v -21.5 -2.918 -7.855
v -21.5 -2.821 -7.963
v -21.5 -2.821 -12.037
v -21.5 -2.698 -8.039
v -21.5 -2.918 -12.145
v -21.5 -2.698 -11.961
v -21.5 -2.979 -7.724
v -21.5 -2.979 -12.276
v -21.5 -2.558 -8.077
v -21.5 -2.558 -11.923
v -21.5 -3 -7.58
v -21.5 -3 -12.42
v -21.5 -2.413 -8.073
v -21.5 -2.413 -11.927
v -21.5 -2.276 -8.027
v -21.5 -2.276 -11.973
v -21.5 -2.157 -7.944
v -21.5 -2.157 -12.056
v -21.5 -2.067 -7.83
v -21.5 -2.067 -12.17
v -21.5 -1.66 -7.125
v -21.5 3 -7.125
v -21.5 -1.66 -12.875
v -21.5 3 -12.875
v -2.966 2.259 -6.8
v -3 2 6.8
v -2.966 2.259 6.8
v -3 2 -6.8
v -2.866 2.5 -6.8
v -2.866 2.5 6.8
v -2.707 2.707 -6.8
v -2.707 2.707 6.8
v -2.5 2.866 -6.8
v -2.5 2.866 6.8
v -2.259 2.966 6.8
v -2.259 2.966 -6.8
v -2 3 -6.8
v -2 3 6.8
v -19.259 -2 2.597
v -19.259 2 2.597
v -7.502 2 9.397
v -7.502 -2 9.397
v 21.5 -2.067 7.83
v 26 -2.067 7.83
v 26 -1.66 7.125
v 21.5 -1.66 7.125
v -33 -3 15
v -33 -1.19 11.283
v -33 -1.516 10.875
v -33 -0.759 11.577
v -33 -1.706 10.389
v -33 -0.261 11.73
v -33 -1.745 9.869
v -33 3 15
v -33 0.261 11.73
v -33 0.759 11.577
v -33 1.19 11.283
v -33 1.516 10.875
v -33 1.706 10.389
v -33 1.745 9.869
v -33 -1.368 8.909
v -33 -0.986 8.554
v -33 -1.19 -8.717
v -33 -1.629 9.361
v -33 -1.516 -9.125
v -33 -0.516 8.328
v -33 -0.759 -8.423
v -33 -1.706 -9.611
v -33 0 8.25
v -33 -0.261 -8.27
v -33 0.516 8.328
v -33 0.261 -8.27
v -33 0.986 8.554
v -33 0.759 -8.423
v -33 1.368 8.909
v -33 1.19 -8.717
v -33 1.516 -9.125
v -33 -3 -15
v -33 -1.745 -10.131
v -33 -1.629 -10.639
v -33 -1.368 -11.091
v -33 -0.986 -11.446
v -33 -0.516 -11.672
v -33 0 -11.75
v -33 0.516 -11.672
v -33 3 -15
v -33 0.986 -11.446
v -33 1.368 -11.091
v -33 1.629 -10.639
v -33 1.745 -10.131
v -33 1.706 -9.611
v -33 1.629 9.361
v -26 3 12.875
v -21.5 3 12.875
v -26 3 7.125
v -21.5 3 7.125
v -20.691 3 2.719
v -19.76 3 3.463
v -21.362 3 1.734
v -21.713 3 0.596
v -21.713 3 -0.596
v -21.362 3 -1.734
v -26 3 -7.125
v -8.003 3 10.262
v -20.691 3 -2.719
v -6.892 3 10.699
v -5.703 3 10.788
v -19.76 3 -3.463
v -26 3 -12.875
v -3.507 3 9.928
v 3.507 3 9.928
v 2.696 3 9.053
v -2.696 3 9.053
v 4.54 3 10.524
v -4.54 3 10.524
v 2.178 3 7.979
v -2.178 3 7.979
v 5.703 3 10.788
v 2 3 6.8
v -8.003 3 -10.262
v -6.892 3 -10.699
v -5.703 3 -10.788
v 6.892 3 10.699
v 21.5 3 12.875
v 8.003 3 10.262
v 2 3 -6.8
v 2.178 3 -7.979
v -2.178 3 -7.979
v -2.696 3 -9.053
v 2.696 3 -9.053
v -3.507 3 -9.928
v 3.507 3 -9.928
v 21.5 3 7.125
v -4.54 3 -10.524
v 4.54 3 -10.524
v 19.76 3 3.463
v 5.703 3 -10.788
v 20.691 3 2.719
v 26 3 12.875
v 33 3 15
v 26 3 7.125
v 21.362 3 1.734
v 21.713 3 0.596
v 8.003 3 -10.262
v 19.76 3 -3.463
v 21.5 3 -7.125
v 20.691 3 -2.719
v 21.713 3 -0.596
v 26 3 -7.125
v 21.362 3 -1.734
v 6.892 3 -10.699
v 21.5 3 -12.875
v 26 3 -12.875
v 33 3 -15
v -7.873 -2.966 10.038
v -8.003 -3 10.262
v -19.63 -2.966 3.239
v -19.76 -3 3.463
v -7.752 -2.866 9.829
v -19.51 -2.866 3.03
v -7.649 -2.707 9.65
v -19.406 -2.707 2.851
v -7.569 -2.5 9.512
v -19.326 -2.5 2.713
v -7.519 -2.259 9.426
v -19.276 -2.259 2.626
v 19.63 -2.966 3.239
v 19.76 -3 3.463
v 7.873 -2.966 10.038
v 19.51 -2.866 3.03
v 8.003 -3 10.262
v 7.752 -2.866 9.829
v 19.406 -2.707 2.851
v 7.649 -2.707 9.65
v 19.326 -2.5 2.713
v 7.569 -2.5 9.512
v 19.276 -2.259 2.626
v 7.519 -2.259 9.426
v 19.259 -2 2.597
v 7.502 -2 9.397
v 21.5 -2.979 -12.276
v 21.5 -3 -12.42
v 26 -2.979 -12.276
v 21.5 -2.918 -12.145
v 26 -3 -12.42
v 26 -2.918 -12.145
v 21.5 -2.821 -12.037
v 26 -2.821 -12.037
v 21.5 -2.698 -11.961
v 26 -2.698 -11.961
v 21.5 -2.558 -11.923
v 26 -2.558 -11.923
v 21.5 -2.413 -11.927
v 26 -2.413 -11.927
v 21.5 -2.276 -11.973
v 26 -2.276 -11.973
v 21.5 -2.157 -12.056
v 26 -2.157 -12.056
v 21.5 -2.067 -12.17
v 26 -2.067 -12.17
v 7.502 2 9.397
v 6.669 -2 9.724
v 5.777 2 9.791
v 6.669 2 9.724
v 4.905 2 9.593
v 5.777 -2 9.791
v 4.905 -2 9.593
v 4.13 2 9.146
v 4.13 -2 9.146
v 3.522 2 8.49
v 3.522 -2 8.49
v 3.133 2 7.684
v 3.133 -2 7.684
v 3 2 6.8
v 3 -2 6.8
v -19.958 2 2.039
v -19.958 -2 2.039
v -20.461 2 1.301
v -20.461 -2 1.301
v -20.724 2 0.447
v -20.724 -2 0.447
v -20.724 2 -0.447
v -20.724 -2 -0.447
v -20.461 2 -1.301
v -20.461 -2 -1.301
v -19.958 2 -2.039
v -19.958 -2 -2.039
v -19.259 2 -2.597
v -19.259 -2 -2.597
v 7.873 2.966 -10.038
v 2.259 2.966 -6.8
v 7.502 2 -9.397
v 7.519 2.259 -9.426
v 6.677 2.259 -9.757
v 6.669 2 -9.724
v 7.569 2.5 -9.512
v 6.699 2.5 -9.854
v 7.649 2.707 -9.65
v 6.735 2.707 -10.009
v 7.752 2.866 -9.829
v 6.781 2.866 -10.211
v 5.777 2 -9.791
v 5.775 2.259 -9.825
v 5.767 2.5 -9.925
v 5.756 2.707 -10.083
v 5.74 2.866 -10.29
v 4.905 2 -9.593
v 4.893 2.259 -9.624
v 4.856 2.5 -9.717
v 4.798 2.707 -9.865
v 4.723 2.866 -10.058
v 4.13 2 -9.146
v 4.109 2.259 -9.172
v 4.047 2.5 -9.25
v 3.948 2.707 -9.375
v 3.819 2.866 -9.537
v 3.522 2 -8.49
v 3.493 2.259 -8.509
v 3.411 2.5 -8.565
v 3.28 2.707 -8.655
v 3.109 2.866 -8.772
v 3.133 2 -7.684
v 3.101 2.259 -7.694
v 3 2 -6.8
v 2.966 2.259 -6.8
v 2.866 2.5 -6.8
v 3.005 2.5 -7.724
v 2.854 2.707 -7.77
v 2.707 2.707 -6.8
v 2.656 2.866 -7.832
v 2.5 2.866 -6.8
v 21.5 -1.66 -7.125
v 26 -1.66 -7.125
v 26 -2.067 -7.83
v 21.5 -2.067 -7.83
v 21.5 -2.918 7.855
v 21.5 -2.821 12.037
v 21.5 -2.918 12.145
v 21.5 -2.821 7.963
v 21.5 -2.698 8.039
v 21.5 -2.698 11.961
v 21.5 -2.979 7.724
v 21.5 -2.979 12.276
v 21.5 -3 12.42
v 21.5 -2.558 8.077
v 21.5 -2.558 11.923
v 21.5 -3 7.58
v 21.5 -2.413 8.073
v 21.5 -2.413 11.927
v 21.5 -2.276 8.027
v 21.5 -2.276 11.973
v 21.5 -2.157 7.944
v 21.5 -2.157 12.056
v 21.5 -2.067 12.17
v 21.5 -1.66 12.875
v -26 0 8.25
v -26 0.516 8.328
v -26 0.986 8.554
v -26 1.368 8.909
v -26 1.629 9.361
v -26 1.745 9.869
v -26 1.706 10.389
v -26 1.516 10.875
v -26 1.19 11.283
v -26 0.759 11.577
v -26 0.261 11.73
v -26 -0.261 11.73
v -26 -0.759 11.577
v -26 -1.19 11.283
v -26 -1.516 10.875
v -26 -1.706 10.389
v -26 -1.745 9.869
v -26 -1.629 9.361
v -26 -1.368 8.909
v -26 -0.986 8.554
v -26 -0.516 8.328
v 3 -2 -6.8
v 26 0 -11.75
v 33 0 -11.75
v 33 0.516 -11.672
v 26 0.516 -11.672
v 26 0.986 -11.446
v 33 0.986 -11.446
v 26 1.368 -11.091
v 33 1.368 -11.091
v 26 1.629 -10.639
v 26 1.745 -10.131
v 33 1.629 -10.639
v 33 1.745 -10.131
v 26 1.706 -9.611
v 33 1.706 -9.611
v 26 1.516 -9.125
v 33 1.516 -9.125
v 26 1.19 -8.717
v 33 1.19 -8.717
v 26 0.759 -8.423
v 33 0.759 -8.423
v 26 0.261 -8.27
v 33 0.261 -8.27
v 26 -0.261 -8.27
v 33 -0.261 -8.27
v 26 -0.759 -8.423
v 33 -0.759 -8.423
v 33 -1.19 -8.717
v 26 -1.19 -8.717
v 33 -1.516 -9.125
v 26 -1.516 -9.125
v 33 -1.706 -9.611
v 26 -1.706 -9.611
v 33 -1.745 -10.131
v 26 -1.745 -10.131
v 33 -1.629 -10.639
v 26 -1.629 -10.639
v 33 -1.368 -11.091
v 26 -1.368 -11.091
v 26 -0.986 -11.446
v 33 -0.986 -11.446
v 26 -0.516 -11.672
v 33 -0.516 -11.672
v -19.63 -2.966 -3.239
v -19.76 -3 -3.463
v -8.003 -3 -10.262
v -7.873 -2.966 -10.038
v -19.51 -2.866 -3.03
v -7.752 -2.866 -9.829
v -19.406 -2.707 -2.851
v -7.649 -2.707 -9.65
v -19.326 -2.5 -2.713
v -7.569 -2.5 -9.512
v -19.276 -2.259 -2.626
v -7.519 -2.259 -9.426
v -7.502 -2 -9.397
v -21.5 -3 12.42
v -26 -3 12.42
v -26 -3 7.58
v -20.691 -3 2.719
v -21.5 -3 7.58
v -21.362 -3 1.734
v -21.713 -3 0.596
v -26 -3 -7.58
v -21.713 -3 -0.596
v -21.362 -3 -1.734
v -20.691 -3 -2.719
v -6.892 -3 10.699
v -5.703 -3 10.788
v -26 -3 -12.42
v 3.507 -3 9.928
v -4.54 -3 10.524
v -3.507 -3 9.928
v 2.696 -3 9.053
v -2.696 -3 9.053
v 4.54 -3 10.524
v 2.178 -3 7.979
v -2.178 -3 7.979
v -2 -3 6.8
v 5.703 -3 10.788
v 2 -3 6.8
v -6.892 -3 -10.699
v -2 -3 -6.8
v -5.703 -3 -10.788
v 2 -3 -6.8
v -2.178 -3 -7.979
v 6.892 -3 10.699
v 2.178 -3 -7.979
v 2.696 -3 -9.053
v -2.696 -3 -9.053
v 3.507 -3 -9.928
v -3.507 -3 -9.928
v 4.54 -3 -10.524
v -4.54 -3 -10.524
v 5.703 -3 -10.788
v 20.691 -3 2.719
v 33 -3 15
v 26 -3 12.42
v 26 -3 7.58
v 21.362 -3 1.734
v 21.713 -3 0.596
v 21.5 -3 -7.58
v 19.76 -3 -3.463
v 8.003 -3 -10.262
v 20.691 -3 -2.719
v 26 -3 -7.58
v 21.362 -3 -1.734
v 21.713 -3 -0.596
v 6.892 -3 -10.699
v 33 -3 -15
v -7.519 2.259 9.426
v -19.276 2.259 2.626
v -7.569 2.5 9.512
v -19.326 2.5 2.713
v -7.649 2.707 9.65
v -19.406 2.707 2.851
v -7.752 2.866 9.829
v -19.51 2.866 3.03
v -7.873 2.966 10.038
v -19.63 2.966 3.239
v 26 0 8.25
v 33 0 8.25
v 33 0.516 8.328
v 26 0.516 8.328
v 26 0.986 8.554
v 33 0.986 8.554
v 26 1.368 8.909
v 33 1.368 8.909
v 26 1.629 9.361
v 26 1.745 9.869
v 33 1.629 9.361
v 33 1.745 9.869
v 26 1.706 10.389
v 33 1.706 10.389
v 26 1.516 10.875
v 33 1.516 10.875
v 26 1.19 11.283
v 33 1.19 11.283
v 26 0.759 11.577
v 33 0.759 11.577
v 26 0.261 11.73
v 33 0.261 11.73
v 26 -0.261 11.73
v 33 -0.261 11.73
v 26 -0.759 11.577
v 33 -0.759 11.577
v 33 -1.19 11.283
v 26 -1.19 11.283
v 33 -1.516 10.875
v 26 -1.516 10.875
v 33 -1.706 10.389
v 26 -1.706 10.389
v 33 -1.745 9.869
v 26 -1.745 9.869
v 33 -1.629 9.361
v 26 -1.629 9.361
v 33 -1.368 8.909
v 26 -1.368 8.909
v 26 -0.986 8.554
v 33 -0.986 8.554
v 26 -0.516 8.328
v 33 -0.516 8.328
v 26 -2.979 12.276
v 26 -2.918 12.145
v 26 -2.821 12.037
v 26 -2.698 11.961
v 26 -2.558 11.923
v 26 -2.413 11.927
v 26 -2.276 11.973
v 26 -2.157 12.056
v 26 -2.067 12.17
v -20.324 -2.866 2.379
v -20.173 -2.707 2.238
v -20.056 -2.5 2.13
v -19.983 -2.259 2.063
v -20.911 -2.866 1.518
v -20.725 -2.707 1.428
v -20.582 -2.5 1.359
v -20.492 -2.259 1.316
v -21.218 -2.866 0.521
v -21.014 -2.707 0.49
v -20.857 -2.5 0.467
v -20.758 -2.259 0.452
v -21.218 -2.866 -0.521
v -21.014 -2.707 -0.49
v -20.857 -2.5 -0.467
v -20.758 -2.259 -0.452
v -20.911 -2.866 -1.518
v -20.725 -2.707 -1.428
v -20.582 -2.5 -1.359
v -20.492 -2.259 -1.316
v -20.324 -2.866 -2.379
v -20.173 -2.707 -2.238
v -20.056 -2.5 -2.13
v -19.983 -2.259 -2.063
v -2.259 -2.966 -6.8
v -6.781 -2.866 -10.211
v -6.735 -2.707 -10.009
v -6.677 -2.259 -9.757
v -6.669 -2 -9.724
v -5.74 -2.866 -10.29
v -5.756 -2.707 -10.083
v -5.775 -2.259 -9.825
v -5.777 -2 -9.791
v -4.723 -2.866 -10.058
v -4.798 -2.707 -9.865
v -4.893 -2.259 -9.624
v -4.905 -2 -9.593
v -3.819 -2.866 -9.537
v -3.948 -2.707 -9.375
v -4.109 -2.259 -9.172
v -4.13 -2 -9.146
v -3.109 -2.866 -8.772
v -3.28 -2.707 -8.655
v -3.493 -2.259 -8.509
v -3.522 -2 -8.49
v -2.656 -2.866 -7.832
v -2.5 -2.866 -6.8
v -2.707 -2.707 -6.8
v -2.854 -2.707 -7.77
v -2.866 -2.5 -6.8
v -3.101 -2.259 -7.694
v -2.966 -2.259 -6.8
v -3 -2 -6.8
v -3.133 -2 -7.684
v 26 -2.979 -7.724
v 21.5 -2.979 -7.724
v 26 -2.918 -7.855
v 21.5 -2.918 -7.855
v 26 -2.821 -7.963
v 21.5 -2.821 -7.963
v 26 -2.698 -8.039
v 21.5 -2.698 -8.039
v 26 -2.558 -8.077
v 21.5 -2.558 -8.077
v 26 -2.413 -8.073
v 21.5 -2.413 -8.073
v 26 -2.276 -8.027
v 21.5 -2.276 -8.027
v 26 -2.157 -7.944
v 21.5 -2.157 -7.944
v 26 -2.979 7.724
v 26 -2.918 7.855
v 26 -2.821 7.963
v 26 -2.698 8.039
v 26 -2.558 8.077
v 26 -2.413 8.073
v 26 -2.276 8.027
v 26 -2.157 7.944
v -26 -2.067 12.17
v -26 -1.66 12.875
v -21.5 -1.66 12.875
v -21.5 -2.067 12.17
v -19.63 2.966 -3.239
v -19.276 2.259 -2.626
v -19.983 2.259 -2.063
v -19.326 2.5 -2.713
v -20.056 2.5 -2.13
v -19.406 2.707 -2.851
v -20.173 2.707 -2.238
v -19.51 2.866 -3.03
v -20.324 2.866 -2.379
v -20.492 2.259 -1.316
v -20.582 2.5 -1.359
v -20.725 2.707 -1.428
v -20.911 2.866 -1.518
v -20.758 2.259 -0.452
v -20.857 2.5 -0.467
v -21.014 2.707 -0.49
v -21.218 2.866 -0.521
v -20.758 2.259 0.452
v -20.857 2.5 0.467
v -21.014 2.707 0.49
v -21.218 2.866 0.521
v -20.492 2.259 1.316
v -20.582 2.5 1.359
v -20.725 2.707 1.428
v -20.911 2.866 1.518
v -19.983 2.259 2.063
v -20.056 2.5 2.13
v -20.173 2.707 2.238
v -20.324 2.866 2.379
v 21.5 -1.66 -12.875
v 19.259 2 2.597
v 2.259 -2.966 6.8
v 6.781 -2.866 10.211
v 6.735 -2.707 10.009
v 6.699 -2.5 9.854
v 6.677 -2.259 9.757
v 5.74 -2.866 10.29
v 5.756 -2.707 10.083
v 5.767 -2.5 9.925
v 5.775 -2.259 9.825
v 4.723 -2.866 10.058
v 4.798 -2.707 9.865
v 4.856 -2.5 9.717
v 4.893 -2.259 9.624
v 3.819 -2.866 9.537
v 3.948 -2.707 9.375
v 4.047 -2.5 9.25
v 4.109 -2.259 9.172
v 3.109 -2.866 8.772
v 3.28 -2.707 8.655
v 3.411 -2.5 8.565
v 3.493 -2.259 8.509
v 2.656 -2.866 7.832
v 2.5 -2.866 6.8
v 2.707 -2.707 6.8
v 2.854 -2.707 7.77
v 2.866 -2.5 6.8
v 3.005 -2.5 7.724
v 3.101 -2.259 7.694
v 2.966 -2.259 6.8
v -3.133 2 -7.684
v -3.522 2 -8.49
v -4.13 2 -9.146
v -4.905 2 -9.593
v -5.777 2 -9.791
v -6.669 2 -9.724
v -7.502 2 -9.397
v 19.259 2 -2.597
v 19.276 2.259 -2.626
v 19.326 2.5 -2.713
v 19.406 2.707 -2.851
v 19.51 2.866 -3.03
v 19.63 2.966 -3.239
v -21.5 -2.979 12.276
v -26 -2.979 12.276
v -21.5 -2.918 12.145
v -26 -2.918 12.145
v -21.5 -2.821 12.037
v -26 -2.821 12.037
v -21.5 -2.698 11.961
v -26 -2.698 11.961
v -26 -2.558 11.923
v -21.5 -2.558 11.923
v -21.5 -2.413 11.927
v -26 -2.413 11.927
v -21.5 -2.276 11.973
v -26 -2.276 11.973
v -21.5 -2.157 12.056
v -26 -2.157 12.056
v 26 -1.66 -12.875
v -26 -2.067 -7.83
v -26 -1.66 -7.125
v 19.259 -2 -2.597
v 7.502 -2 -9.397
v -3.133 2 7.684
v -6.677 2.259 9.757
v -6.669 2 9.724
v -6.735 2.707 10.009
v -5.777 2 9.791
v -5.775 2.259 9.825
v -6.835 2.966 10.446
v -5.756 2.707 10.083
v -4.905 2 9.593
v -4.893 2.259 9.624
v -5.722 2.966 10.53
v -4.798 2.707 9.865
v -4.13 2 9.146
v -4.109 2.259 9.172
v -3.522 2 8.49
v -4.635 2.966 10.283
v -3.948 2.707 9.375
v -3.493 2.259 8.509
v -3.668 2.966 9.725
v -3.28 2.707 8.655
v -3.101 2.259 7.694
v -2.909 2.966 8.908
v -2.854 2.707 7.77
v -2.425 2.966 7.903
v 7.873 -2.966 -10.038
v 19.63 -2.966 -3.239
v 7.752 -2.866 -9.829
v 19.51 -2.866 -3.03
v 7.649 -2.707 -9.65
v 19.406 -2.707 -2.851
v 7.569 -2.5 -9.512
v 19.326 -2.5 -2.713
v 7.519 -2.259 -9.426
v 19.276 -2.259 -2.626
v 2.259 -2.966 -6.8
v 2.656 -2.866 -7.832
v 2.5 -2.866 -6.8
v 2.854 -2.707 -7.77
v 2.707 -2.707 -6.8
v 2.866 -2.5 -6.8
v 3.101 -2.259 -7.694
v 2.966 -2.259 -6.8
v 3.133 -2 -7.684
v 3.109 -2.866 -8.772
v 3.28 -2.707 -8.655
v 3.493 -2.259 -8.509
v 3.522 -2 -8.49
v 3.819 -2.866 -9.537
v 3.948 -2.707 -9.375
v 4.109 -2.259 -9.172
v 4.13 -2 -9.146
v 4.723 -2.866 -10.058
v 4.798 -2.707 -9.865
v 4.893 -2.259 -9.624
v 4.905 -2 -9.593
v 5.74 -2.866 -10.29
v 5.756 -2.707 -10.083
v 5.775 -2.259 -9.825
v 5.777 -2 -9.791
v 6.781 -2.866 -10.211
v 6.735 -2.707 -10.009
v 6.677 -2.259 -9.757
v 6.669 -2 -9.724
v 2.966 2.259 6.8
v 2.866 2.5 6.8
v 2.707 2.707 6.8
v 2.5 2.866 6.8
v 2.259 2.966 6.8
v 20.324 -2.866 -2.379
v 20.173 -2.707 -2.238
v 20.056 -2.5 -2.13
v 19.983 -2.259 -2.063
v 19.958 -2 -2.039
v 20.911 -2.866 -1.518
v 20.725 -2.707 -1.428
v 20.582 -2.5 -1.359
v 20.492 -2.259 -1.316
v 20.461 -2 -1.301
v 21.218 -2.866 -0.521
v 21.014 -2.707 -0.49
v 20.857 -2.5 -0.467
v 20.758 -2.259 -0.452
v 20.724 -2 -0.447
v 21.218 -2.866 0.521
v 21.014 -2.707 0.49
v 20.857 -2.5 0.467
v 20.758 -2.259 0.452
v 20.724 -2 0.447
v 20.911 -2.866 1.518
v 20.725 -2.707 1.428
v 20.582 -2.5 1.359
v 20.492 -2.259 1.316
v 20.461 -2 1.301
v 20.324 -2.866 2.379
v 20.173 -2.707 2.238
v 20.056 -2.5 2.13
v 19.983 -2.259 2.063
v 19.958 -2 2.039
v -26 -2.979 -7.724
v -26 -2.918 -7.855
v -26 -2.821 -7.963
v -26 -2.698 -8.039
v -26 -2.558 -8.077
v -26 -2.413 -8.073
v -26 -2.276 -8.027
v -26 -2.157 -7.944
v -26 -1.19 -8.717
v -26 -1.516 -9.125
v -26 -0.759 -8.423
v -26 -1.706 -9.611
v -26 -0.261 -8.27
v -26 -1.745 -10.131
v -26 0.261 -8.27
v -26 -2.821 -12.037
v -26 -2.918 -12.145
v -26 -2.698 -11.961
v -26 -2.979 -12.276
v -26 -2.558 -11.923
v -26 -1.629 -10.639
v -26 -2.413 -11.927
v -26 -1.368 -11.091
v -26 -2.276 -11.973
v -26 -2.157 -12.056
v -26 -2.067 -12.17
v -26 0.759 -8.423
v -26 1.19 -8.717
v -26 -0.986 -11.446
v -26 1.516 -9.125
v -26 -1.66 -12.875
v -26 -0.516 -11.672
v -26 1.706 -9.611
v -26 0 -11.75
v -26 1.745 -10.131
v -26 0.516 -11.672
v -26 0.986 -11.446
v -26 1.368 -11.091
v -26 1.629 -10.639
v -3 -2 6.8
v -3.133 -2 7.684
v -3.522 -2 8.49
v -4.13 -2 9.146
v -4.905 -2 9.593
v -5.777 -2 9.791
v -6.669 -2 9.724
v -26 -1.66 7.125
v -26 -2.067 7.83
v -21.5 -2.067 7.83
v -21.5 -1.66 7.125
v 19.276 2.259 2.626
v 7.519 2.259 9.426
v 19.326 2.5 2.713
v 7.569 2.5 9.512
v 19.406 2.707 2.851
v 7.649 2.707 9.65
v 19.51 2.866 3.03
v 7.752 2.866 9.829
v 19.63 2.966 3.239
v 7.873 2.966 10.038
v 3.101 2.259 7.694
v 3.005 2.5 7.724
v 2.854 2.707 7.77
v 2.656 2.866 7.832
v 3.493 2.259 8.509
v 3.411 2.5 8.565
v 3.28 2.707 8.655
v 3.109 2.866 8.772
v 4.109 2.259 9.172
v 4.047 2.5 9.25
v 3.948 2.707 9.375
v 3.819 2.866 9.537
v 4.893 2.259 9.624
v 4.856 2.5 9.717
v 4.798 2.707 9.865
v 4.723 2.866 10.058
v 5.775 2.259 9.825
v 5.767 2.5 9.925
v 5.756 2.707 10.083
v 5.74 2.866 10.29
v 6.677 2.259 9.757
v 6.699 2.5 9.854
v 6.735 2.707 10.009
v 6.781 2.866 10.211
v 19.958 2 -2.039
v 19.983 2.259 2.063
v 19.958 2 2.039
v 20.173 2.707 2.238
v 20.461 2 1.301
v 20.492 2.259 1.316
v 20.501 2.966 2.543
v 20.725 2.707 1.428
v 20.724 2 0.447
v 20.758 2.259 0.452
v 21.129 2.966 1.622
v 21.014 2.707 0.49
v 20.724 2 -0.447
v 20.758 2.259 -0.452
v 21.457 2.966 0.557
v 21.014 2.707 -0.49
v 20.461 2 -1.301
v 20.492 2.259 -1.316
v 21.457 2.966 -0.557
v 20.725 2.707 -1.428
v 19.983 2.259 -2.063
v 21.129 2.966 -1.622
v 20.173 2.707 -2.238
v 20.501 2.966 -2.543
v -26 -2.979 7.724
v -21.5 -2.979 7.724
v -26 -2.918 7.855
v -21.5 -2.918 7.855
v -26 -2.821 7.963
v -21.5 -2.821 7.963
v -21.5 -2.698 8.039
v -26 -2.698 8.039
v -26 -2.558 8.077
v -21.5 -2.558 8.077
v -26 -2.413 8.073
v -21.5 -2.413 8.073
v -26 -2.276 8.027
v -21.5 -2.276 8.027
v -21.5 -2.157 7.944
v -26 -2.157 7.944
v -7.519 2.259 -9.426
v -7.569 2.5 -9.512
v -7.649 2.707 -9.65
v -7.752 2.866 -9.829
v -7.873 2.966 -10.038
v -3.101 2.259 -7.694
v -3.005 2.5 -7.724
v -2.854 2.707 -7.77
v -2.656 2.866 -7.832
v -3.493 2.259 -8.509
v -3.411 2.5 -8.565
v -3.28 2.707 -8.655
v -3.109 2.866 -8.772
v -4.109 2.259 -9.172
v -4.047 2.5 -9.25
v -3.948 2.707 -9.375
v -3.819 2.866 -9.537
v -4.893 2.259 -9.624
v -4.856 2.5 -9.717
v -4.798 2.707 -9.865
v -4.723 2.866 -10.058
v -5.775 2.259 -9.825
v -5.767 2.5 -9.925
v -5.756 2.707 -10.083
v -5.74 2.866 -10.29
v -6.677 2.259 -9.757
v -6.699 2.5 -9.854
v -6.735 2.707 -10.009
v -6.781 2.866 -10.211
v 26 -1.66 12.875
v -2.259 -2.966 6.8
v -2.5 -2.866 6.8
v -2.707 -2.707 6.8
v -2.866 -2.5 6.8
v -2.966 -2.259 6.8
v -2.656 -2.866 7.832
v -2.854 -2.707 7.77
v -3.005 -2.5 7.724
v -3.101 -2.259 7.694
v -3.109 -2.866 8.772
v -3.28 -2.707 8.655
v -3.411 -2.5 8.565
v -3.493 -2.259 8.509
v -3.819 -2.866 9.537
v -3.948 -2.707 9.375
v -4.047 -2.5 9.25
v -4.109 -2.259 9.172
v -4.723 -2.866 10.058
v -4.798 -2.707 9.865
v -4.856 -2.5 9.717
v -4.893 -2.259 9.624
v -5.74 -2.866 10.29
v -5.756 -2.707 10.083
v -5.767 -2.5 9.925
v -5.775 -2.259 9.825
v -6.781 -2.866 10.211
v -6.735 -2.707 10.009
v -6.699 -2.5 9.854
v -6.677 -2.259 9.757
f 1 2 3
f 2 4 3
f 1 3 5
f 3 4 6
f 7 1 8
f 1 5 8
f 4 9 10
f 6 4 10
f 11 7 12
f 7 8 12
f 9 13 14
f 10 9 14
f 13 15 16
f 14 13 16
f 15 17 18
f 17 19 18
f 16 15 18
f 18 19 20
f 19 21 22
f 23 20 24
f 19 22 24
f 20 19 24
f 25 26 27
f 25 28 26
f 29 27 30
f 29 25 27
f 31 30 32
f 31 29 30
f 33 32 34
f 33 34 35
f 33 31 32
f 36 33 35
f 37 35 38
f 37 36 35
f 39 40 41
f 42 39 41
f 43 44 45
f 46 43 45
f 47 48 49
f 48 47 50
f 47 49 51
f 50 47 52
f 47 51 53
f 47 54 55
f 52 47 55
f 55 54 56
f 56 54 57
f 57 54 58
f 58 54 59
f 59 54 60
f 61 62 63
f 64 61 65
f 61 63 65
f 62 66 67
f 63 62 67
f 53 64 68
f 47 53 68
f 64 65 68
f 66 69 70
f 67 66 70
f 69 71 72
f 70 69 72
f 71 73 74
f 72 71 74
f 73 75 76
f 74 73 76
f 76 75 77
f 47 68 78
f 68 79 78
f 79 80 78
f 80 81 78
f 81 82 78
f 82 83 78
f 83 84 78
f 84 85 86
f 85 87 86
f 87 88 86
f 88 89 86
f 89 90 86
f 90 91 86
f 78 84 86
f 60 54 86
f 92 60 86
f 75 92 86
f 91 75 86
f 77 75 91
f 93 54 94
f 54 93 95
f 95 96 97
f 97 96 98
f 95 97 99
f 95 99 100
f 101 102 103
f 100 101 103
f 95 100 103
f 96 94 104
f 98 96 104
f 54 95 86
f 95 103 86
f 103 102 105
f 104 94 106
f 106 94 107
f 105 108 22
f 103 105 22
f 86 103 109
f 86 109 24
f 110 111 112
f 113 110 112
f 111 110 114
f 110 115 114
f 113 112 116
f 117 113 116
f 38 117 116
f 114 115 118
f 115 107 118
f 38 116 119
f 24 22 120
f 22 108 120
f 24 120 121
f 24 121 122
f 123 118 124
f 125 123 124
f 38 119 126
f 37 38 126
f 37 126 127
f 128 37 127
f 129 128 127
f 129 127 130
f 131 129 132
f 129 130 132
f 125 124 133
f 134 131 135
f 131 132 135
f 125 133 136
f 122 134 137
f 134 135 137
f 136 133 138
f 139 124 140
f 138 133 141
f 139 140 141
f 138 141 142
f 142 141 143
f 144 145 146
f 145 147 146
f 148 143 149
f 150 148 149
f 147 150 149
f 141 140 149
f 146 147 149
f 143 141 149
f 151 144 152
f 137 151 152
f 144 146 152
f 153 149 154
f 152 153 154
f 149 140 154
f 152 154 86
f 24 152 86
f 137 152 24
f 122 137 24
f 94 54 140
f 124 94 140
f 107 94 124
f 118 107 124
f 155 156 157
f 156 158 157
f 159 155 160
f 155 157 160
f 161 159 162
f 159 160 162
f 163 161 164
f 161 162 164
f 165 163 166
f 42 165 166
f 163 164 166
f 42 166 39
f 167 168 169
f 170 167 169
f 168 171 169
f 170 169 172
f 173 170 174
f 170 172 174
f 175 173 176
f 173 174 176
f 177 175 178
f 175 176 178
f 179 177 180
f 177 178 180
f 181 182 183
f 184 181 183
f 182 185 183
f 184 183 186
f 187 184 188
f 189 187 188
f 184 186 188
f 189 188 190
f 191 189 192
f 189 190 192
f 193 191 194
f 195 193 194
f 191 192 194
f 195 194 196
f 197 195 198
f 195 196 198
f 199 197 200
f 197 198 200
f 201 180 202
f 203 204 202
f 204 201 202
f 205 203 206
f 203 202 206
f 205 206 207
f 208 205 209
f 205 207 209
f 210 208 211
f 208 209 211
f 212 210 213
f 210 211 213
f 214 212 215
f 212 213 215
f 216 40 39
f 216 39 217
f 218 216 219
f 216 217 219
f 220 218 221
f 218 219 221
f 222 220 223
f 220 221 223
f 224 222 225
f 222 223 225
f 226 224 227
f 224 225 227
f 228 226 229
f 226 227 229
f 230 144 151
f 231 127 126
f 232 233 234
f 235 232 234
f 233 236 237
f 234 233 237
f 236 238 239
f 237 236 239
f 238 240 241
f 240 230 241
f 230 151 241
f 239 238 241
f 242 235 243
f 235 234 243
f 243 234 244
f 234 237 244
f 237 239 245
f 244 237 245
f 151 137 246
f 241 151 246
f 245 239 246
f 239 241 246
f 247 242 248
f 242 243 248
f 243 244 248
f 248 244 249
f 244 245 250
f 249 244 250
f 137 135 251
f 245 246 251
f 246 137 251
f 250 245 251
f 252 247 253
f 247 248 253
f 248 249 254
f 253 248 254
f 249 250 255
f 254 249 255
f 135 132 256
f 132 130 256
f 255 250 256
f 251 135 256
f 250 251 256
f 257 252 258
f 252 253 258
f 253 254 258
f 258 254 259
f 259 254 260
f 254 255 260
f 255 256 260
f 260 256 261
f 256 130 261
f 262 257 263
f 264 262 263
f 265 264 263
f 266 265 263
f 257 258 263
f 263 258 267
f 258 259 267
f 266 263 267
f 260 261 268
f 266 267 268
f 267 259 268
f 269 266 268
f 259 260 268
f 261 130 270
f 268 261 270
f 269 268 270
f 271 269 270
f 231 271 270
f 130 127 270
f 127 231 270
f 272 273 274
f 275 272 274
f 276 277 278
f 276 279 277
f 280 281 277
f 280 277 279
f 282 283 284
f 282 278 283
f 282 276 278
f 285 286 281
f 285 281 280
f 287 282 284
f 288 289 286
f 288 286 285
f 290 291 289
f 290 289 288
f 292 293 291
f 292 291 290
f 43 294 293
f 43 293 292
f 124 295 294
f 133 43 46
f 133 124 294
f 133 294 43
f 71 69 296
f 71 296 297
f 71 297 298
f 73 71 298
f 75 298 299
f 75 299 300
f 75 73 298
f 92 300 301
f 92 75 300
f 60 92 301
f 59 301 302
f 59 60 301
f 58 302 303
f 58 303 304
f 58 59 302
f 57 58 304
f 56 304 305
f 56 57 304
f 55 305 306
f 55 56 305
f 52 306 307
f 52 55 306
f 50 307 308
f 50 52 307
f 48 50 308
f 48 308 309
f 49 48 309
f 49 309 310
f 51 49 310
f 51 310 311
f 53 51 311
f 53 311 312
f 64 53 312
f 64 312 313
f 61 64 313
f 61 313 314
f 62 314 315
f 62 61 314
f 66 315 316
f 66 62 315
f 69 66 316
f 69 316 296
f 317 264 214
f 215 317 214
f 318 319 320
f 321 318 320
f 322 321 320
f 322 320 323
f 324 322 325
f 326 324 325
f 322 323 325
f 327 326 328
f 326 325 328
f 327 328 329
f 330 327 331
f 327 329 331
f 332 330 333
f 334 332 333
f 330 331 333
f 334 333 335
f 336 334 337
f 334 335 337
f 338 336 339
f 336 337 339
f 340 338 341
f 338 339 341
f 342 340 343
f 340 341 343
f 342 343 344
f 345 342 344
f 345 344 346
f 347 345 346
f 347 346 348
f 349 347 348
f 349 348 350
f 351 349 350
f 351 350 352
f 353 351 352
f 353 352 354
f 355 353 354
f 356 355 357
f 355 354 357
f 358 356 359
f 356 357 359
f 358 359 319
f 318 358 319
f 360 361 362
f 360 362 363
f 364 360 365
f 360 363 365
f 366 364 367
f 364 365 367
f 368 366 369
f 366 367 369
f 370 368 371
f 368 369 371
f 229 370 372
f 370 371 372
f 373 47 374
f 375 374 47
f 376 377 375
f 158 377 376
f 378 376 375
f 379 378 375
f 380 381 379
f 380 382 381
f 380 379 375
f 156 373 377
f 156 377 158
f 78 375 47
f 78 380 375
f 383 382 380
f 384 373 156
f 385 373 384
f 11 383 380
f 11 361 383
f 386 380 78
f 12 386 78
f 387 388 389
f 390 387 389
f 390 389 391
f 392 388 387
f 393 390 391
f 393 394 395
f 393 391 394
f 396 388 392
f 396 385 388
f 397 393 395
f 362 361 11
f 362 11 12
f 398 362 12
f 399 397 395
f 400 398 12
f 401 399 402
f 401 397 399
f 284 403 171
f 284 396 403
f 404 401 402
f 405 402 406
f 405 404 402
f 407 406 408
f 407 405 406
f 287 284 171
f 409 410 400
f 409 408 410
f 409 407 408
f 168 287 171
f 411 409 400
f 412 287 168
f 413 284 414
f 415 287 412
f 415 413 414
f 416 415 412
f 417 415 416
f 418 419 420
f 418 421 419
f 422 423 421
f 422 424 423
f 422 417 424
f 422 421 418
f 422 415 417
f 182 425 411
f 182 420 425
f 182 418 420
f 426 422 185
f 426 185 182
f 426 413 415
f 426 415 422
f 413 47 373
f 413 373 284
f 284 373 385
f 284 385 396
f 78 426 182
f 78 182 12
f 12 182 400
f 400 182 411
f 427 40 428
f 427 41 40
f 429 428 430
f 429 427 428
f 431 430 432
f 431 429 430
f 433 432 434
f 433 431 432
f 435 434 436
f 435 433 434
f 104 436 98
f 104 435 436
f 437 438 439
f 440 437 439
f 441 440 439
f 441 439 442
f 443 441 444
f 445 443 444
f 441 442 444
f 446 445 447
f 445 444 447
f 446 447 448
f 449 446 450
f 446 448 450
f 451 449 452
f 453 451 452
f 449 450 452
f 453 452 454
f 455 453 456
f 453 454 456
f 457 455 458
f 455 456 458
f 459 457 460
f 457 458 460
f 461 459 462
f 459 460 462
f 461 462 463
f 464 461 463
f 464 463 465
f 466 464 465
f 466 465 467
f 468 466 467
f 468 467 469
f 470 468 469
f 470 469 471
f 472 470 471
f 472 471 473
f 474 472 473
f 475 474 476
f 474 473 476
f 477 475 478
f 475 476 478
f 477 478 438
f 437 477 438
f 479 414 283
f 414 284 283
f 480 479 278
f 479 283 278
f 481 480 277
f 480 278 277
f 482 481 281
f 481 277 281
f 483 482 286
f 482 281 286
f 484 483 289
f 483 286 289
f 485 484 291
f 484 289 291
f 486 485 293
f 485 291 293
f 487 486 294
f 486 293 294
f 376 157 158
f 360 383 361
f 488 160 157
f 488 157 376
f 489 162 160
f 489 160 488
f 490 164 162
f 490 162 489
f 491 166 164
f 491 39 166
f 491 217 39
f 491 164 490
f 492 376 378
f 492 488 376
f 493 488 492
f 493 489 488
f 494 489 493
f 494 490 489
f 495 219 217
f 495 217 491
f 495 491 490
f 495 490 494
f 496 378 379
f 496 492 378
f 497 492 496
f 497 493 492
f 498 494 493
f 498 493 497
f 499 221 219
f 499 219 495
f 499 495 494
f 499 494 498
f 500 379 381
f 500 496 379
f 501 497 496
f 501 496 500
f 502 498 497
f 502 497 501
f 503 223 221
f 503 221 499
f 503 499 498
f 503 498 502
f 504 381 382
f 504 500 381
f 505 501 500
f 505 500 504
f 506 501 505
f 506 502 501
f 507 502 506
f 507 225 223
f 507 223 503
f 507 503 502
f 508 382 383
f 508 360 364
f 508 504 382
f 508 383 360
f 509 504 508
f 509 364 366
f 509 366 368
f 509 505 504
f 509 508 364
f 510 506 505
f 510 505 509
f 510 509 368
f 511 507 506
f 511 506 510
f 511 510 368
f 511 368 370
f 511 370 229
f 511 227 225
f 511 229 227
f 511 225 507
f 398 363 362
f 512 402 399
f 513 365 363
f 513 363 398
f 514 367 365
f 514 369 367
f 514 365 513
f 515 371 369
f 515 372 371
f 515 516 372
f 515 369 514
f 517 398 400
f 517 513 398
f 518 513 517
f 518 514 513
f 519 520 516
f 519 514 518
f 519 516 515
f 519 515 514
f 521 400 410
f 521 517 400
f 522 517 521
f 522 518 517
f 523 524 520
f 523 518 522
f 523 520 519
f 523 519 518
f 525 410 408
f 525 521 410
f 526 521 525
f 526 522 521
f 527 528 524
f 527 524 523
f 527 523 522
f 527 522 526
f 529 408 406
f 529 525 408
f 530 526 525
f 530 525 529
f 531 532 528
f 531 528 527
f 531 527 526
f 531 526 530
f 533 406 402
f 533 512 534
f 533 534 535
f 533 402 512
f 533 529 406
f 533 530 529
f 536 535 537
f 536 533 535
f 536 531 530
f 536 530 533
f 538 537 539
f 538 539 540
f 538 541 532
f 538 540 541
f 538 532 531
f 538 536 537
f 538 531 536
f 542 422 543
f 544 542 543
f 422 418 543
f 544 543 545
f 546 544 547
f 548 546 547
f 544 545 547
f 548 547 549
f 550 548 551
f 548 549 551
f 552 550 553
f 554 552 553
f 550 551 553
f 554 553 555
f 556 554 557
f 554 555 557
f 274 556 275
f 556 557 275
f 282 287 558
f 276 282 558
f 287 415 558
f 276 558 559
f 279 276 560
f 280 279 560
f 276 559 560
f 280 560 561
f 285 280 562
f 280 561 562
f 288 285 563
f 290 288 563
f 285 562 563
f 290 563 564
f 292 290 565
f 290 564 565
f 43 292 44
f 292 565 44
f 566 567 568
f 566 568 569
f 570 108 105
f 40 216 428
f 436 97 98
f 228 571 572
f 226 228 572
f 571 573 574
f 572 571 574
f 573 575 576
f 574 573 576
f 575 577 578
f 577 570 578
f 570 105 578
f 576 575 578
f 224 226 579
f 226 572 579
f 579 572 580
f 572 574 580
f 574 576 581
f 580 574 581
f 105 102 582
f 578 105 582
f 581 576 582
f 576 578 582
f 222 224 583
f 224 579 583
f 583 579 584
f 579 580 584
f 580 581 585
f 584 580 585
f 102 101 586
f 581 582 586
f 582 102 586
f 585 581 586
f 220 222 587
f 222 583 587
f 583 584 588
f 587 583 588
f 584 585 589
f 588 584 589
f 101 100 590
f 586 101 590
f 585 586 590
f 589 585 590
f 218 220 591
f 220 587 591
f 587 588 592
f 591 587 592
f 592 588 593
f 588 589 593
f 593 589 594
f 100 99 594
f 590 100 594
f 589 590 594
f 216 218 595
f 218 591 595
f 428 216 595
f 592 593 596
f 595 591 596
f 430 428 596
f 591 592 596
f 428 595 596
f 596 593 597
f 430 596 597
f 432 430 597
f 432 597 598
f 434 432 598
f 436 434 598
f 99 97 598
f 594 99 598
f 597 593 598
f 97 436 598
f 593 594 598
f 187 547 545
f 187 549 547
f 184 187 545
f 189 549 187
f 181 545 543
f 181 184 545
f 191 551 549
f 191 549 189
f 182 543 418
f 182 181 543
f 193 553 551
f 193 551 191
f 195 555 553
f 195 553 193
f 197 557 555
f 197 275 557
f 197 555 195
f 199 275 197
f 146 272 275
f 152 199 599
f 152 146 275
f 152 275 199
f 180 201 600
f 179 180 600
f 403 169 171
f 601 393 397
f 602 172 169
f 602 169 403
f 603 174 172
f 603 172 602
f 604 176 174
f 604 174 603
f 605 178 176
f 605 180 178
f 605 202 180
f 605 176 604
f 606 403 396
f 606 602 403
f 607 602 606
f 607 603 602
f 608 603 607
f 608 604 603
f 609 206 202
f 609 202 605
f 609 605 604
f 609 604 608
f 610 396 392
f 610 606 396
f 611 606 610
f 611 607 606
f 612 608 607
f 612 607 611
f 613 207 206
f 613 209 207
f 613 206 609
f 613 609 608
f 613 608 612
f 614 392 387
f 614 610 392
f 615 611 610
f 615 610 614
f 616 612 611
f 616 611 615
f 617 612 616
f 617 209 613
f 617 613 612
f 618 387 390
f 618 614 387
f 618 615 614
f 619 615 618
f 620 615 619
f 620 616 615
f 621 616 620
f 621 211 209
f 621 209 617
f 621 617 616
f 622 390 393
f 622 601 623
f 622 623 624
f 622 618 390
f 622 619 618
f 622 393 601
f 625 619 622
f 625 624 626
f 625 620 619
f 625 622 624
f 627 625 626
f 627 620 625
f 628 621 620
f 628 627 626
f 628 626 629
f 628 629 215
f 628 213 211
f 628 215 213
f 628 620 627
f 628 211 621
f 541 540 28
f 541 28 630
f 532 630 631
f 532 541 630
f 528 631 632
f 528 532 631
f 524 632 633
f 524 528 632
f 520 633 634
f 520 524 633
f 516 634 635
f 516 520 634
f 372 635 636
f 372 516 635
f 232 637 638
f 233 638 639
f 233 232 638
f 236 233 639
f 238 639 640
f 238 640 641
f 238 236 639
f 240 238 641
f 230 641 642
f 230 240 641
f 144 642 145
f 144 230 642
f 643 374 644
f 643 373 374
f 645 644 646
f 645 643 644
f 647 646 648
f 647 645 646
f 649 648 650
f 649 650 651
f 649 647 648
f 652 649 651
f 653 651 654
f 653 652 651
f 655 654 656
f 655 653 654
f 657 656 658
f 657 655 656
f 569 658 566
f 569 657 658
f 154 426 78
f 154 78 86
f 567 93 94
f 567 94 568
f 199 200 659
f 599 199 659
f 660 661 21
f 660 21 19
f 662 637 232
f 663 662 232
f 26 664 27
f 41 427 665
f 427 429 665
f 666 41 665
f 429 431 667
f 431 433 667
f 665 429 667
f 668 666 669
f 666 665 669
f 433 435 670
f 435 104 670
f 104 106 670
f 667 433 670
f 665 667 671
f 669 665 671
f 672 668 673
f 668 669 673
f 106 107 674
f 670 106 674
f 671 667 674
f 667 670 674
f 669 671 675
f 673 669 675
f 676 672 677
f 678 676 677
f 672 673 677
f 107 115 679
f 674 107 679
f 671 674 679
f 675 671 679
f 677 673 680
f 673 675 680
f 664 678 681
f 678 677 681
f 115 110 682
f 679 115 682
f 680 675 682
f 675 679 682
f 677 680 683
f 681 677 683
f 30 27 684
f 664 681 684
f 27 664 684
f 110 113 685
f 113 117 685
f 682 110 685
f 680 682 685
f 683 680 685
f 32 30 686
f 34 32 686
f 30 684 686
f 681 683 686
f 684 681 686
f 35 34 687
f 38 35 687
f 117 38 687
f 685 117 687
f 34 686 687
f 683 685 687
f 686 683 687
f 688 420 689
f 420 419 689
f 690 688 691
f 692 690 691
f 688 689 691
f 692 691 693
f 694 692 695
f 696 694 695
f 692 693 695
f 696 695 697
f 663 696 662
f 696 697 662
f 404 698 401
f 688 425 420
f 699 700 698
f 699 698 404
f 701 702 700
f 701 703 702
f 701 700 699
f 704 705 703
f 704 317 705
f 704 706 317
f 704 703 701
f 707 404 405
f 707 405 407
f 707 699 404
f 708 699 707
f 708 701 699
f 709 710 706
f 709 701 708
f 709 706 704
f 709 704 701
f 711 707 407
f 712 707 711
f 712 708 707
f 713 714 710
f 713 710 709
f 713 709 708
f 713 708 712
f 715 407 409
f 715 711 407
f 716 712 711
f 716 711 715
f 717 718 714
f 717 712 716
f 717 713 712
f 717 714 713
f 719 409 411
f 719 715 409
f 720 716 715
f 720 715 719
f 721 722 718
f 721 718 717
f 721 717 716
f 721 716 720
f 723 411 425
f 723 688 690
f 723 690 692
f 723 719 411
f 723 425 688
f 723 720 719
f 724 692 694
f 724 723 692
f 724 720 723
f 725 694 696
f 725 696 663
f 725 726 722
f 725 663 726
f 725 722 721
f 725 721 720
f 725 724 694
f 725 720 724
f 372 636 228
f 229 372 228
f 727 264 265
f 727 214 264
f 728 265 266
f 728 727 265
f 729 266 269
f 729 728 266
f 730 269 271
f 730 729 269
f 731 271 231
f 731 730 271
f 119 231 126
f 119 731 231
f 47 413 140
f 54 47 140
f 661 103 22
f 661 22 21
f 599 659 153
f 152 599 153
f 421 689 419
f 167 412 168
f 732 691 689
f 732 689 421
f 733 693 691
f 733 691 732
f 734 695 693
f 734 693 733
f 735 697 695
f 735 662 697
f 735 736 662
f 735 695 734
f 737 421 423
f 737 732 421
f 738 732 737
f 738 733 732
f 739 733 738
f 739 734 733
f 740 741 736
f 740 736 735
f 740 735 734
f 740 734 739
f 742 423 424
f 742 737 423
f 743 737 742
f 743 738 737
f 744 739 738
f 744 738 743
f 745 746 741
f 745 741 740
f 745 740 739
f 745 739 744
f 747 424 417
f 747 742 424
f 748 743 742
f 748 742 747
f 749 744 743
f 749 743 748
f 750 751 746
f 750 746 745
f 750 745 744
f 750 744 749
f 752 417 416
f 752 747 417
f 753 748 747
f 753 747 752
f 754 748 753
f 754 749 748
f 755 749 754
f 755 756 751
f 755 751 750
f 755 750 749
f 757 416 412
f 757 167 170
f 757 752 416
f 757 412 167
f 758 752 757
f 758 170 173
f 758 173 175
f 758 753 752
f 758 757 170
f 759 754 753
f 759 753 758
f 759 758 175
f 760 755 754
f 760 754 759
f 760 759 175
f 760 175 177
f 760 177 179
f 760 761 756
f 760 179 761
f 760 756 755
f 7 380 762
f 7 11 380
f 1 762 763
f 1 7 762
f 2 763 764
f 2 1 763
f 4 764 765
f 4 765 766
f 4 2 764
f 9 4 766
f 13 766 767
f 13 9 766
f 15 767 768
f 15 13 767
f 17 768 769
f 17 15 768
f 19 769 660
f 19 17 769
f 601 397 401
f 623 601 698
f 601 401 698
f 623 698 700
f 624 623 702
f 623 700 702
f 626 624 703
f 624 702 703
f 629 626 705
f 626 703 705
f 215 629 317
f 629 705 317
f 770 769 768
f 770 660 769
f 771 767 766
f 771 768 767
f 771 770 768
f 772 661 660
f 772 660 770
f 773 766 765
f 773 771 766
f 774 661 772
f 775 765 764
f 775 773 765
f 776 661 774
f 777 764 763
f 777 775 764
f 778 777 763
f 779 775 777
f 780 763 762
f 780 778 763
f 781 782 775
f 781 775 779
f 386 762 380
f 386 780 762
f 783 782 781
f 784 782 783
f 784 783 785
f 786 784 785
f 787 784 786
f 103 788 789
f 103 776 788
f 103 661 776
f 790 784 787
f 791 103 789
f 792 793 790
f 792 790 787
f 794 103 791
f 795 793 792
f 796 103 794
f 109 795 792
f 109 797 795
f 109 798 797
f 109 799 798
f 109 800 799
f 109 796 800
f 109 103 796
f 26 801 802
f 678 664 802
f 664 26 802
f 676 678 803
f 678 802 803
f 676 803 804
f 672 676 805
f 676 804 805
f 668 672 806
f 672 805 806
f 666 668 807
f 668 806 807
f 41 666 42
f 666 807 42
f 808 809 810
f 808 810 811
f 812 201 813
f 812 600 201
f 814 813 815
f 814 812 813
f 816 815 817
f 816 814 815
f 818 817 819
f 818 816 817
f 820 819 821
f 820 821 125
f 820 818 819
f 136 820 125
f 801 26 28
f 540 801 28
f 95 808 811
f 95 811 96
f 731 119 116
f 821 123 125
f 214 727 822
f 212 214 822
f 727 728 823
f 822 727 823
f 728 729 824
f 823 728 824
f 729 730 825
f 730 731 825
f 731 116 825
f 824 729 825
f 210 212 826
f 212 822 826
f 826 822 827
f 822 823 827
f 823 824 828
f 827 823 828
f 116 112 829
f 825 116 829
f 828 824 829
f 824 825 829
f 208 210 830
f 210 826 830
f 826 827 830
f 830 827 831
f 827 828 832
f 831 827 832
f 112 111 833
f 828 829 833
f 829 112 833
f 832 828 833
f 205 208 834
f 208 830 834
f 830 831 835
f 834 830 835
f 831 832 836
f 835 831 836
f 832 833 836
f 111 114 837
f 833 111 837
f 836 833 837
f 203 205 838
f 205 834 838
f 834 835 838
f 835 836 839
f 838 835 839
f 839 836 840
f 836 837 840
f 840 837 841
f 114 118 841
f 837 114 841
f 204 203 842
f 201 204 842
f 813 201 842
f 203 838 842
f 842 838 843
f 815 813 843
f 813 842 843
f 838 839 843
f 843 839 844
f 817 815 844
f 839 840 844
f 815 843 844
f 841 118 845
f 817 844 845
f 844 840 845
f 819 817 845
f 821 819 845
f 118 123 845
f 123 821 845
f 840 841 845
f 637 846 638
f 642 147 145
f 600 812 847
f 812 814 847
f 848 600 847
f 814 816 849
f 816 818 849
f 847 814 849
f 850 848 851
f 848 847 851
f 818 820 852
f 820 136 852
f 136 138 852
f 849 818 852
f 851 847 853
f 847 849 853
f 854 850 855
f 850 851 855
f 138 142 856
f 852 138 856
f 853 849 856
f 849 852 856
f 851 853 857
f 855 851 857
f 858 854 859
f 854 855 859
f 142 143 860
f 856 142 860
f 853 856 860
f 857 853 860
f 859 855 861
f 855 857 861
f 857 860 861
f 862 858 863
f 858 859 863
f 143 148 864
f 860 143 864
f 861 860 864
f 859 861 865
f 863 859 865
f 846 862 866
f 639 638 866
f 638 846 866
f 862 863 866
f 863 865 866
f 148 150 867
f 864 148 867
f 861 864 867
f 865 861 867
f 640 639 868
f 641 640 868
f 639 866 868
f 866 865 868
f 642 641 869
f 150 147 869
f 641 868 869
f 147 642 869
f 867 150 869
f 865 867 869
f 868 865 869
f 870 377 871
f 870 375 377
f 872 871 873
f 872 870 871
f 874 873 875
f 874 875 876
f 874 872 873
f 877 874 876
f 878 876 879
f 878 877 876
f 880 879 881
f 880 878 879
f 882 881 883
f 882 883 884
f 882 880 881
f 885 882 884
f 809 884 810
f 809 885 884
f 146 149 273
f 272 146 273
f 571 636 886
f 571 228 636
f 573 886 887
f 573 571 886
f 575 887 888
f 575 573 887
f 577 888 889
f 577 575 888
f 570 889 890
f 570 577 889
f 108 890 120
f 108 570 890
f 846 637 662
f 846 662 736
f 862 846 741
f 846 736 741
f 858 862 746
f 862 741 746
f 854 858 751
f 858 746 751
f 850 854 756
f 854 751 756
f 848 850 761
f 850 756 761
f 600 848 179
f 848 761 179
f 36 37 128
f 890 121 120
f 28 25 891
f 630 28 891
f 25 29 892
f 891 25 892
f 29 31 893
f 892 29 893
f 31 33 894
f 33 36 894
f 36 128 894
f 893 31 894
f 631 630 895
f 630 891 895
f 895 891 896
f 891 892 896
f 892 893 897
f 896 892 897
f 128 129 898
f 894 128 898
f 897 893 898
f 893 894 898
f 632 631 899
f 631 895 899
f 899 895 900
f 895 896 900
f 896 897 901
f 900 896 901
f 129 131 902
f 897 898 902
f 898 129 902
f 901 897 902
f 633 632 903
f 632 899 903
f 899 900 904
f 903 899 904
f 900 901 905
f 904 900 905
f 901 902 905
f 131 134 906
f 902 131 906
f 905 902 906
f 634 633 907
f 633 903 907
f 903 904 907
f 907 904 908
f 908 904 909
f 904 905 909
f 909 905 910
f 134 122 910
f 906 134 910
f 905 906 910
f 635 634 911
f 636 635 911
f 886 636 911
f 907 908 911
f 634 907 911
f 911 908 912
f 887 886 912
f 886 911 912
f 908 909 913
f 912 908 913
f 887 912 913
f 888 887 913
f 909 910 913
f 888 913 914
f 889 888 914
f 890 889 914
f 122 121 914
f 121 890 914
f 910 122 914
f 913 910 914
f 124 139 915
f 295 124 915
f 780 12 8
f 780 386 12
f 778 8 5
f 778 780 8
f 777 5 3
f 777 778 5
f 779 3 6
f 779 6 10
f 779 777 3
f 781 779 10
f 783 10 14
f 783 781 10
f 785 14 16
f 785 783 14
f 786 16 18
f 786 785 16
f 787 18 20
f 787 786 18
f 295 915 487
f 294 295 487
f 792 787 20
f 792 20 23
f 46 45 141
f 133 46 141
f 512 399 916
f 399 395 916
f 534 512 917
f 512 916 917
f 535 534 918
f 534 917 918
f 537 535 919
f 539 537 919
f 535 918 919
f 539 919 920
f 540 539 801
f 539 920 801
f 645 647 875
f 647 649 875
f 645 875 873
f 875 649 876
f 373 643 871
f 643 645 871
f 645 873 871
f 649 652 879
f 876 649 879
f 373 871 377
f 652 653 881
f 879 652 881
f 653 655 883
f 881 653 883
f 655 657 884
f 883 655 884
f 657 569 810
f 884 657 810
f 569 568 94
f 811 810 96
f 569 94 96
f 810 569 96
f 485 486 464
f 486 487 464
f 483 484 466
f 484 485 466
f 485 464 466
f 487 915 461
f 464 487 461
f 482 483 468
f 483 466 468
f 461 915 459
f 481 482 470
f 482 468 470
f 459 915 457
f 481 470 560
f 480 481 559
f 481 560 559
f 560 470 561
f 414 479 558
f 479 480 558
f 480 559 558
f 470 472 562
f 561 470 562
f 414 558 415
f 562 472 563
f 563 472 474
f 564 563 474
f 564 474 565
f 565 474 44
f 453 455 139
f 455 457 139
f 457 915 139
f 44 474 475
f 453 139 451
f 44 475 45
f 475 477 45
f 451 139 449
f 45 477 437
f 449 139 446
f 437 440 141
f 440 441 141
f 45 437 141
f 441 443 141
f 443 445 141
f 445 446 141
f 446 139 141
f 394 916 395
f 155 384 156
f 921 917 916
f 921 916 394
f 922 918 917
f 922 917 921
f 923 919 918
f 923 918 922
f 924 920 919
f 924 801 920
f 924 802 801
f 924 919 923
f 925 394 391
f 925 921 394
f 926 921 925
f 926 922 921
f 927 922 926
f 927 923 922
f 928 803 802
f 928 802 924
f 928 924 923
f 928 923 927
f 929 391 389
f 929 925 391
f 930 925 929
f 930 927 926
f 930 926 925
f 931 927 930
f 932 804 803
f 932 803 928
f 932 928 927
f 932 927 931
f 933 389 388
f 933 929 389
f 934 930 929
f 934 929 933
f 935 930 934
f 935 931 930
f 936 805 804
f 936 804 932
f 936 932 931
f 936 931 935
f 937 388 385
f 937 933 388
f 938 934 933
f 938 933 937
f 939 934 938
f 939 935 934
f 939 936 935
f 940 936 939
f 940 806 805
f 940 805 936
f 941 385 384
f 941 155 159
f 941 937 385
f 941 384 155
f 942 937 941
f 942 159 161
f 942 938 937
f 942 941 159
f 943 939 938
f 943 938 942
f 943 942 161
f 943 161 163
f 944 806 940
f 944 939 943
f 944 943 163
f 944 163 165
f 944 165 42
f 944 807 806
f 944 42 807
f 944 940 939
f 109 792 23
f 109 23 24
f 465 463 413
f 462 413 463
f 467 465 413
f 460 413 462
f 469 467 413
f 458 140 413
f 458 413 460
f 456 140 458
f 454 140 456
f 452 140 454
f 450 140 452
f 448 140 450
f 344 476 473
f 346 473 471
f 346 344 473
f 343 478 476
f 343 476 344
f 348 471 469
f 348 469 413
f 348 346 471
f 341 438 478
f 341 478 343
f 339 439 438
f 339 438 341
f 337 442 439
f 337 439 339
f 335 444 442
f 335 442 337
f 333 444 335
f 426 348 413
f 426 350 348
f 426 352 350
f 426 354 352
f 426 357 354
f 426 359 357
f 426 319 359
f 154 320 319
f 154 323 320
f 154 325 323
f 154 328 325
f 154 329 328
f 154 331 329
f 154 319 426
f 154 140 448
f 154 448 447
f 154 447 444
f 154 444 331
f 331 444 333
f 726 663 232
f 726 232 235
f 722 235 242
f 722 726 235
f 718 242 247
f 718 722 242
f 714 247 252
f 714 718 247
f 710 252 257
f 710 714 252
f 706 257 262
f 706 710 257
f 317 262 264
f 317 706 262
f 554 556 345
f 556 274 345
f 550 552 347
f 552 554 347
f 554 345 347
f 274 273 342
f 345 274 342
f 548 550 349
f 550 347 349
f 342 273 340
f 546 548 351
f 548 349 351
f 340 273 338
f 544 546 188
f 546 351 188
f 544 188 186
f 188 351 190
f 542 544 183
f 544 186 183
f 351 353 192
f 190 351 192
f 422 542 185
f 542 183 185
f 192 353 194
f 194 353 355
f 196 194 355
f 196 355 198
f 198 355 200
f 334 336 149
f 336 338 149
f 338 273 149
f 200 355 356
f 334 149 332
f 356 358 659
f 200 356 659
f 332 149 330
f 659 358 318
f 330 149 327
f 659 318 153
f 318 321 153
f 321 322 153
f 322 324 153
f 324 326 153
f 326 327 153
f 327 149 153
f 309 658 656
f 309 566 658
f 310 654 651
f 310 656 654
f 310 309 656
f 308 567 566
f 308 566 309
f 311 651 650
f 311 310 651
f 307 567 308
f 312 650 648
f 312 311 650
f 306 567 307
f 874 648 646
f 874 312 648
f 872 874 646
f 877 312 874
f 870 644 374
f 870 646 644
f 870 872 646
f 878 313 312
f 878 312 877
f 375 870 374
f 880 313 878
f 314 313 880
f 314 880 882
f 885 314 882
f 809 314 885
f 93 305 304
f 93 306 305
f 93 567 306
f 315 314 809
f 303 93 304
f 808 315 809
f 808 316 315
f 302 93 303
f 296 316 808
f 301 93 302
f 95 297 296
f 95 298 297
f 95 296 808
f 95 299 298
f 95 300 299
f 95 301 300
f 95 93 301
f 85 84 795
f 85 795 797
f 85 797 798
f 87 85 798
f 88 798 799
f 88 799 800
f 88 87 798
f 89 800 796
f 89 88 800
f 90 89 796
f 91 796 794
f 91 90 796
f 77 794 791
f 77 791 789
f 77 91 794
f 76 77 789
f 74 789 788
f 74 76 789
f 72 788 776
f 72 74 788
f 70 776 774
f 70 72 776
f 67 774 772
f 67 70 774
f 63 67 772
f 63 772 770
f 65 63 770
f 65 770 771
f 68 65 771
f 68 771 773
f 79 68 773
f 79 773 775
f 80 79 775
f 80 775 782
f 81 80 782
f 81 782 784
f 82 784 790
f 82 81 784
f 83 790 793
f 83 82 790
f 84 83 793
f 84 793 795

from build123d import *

# Parameters (mm, degrees)
SKETCH1_W           = 30
SKETCH1_H           = 6
BOSS_EXTRUDE1_DEPTH = 33
SKETCH2_R           = 1.75
CUT_EXTRUDE1_DEPTH  = 7
CUT_EXTRUDE2_DEPTH  = 4.5
CUT_EXTRUDE3_DEPTH  = 7
FILLET1_R           = 3
FILLET2_R           = 1
FILLET3_R           = 0.5


with BuildPart() as part:
    # Sketch1 → Boss-Extrude1 (new body, symmetric)
    with BuildSketch(Plane(origin=(0, 0, 0), x_dir=(0, 0, -1), z_dir=(1, 0, 0))):
        Rectangle(SKETCH1_W, SKETCH1_H)
    extrude(amount=BOSS_EXTRUDE1_DEPTH, both=True)

    # Sketch2 → Cut-Extrude1 (cut)
    with BuildSketch(Plane(origin=(33, 0, 0), x_dir=(0, 0, -1), z_dir=(1, 0, 0))):
        with Locations((-10, 0)):
            Circle(SKETCH2_R)
        with Locations((10, 0)):
            Circle(SKETCH2_R)
    cut_extrude1 = extrude(amount=-CUT_EXTRUDE1_DEPTH, mode=Mode.SUBTRACT)

    # Sketch3 → Cut-Extrude2 (cut)
    with BuildSketch(Plane(origin=(26, 0, 0), x_dir=(0, 0, -1), z_dir=(1, 0, 0))):
        Polygon((-12.875, 3), (-12.875, 1.659882024), (-10.553847577, 3), align=None)
        Polygon((-10.553847577, 3), (-12.875, 1.659882024), (-12.875, -1.659882024), (-10, -3.319764048), (-7.125, -1.659882024), (-7.125, 1.659882024), (-9.446152423, 3), align=None)
        Polygon((-10, 3.319764048), (-10.553847577, 3), (-9.446152423, 3), align=None)
        Polygon((-7.125, 3), (-9.446152423, 3), (-7.125, 1.659882024), align=None)
        Polygon((12.875, 3), (7.125, 3), (7.125, 1.659882024), (7.125, -1.659882024), (10, -3.319764048), (12.875, -1.659882024), (12.875, 1.659882024), align=None)
    cut_extrude2 = extrude(amount=-CUT_EXTRUDE2_DEPTH, mode=Mode.SUBTRACT)

    # Mirror1: Cut-Extrude1, Cut-Extrude2 across plane
    add(cut_extrude1.mirror(Plane(origin=(0, 0, 0), x_dir=(0, 0, 1), z_dir=(1, 0, 0))), mode=Mode.SUBTRACT)
    add(cut_extrude2.mirror(Plane(origin=(0, 0, 0), x_dir=(0, 0, 1), z_dir=(1, 0, 0))), mode=Mode.SUBTRACT)

    # Sketch4 → Cut-Extrude3 (cut, through all)
    with BuildSketch(Plane(origin=(0, 3, 0), x_dir=(1, 0, 0), z_dir=(0, 1, 0))):
        Polygon((-3, -12), (-3, 12), (-23.75, 0), align=None)
        Polygon((23.75, 0), (3, 12), (3, -12), align=None)
    extrude(amount=-CUT_EXTRUDE3_DEPTH, mode=Mode.SUBTRACT)

    # Fillet1
    fillet1_edges = [part.edges().sort_by_distance(p)[0] for p in [
        (-23.75, 0, 0),
        (-3, 0, -12),
        (-3, 0, 12),
        (23.75, 0, 0),
        (3, 0, 12),
        (3, 0, -12),
    ]]
    fillet(fillet1_edges, radius=FILLET1_R)

    # Fillet2
    fillet2_edges = [part.edges().sort_by_distance(p)[0] for p in [
        (13.380621084, 3, -5.996749253),
        (13.380621084, -3, -5.996749253),
        (13.380621084, 3, 5.996749253),
        (13.380621084, -3, 5.996749253),
        (3, 3, 0),
        (3, -3, 0),
        (-3, 3, 0),
        (-3, -3, 0),
        (-13.380621084, 3, 5.996749253),
        (-13.380621084, -3, 5.996749253),
        (-13.380621084, 3, -5.996749253),
        (-13.380621084, -3, -5.996749253),
        (20.757491656, 3, 0),
        (20.757491656, -3, 0),
        (4.500937921, 3, 9.398130742),
        (4.500937921, -3, 9.398130742),
        (4.500937921, 3, -9.398130742),
        (4.500937921, -3, -9.398130742),
        (-4.500937921, 3, 9.398130742),
        (-4.500937921, -3, 9.398130742),
        (-20.757491656, 3, 0),
        (-20.757491656, -3, 0),
        (-4.500937921, 3, -9.398130742),
        (-4.500937921, -3, -9.398130742),
    ]]
    fillet(fillet2_edges, radius=FILLET2_R)

    # Fillet3
    fillet3_edges = [part.edges().sort_by_distance(p)[0] for p in [
        (23.75, -3, 10.553847577),
        (23.75, -3, 9.446152423),
        (23.75, -3, -9.446152423),
        (23.75, -3, -10.553847577),
        (-23.75, -3, 9.446152423),
        (-23.75, -3, 10.553847577),
        (-23.75, -3, -10.553847577),
        (-23.75, -3, -9.446152423),
    ]]
    fillet(fillet3_edges, radius=FILLET3_R)


solid = part.part
